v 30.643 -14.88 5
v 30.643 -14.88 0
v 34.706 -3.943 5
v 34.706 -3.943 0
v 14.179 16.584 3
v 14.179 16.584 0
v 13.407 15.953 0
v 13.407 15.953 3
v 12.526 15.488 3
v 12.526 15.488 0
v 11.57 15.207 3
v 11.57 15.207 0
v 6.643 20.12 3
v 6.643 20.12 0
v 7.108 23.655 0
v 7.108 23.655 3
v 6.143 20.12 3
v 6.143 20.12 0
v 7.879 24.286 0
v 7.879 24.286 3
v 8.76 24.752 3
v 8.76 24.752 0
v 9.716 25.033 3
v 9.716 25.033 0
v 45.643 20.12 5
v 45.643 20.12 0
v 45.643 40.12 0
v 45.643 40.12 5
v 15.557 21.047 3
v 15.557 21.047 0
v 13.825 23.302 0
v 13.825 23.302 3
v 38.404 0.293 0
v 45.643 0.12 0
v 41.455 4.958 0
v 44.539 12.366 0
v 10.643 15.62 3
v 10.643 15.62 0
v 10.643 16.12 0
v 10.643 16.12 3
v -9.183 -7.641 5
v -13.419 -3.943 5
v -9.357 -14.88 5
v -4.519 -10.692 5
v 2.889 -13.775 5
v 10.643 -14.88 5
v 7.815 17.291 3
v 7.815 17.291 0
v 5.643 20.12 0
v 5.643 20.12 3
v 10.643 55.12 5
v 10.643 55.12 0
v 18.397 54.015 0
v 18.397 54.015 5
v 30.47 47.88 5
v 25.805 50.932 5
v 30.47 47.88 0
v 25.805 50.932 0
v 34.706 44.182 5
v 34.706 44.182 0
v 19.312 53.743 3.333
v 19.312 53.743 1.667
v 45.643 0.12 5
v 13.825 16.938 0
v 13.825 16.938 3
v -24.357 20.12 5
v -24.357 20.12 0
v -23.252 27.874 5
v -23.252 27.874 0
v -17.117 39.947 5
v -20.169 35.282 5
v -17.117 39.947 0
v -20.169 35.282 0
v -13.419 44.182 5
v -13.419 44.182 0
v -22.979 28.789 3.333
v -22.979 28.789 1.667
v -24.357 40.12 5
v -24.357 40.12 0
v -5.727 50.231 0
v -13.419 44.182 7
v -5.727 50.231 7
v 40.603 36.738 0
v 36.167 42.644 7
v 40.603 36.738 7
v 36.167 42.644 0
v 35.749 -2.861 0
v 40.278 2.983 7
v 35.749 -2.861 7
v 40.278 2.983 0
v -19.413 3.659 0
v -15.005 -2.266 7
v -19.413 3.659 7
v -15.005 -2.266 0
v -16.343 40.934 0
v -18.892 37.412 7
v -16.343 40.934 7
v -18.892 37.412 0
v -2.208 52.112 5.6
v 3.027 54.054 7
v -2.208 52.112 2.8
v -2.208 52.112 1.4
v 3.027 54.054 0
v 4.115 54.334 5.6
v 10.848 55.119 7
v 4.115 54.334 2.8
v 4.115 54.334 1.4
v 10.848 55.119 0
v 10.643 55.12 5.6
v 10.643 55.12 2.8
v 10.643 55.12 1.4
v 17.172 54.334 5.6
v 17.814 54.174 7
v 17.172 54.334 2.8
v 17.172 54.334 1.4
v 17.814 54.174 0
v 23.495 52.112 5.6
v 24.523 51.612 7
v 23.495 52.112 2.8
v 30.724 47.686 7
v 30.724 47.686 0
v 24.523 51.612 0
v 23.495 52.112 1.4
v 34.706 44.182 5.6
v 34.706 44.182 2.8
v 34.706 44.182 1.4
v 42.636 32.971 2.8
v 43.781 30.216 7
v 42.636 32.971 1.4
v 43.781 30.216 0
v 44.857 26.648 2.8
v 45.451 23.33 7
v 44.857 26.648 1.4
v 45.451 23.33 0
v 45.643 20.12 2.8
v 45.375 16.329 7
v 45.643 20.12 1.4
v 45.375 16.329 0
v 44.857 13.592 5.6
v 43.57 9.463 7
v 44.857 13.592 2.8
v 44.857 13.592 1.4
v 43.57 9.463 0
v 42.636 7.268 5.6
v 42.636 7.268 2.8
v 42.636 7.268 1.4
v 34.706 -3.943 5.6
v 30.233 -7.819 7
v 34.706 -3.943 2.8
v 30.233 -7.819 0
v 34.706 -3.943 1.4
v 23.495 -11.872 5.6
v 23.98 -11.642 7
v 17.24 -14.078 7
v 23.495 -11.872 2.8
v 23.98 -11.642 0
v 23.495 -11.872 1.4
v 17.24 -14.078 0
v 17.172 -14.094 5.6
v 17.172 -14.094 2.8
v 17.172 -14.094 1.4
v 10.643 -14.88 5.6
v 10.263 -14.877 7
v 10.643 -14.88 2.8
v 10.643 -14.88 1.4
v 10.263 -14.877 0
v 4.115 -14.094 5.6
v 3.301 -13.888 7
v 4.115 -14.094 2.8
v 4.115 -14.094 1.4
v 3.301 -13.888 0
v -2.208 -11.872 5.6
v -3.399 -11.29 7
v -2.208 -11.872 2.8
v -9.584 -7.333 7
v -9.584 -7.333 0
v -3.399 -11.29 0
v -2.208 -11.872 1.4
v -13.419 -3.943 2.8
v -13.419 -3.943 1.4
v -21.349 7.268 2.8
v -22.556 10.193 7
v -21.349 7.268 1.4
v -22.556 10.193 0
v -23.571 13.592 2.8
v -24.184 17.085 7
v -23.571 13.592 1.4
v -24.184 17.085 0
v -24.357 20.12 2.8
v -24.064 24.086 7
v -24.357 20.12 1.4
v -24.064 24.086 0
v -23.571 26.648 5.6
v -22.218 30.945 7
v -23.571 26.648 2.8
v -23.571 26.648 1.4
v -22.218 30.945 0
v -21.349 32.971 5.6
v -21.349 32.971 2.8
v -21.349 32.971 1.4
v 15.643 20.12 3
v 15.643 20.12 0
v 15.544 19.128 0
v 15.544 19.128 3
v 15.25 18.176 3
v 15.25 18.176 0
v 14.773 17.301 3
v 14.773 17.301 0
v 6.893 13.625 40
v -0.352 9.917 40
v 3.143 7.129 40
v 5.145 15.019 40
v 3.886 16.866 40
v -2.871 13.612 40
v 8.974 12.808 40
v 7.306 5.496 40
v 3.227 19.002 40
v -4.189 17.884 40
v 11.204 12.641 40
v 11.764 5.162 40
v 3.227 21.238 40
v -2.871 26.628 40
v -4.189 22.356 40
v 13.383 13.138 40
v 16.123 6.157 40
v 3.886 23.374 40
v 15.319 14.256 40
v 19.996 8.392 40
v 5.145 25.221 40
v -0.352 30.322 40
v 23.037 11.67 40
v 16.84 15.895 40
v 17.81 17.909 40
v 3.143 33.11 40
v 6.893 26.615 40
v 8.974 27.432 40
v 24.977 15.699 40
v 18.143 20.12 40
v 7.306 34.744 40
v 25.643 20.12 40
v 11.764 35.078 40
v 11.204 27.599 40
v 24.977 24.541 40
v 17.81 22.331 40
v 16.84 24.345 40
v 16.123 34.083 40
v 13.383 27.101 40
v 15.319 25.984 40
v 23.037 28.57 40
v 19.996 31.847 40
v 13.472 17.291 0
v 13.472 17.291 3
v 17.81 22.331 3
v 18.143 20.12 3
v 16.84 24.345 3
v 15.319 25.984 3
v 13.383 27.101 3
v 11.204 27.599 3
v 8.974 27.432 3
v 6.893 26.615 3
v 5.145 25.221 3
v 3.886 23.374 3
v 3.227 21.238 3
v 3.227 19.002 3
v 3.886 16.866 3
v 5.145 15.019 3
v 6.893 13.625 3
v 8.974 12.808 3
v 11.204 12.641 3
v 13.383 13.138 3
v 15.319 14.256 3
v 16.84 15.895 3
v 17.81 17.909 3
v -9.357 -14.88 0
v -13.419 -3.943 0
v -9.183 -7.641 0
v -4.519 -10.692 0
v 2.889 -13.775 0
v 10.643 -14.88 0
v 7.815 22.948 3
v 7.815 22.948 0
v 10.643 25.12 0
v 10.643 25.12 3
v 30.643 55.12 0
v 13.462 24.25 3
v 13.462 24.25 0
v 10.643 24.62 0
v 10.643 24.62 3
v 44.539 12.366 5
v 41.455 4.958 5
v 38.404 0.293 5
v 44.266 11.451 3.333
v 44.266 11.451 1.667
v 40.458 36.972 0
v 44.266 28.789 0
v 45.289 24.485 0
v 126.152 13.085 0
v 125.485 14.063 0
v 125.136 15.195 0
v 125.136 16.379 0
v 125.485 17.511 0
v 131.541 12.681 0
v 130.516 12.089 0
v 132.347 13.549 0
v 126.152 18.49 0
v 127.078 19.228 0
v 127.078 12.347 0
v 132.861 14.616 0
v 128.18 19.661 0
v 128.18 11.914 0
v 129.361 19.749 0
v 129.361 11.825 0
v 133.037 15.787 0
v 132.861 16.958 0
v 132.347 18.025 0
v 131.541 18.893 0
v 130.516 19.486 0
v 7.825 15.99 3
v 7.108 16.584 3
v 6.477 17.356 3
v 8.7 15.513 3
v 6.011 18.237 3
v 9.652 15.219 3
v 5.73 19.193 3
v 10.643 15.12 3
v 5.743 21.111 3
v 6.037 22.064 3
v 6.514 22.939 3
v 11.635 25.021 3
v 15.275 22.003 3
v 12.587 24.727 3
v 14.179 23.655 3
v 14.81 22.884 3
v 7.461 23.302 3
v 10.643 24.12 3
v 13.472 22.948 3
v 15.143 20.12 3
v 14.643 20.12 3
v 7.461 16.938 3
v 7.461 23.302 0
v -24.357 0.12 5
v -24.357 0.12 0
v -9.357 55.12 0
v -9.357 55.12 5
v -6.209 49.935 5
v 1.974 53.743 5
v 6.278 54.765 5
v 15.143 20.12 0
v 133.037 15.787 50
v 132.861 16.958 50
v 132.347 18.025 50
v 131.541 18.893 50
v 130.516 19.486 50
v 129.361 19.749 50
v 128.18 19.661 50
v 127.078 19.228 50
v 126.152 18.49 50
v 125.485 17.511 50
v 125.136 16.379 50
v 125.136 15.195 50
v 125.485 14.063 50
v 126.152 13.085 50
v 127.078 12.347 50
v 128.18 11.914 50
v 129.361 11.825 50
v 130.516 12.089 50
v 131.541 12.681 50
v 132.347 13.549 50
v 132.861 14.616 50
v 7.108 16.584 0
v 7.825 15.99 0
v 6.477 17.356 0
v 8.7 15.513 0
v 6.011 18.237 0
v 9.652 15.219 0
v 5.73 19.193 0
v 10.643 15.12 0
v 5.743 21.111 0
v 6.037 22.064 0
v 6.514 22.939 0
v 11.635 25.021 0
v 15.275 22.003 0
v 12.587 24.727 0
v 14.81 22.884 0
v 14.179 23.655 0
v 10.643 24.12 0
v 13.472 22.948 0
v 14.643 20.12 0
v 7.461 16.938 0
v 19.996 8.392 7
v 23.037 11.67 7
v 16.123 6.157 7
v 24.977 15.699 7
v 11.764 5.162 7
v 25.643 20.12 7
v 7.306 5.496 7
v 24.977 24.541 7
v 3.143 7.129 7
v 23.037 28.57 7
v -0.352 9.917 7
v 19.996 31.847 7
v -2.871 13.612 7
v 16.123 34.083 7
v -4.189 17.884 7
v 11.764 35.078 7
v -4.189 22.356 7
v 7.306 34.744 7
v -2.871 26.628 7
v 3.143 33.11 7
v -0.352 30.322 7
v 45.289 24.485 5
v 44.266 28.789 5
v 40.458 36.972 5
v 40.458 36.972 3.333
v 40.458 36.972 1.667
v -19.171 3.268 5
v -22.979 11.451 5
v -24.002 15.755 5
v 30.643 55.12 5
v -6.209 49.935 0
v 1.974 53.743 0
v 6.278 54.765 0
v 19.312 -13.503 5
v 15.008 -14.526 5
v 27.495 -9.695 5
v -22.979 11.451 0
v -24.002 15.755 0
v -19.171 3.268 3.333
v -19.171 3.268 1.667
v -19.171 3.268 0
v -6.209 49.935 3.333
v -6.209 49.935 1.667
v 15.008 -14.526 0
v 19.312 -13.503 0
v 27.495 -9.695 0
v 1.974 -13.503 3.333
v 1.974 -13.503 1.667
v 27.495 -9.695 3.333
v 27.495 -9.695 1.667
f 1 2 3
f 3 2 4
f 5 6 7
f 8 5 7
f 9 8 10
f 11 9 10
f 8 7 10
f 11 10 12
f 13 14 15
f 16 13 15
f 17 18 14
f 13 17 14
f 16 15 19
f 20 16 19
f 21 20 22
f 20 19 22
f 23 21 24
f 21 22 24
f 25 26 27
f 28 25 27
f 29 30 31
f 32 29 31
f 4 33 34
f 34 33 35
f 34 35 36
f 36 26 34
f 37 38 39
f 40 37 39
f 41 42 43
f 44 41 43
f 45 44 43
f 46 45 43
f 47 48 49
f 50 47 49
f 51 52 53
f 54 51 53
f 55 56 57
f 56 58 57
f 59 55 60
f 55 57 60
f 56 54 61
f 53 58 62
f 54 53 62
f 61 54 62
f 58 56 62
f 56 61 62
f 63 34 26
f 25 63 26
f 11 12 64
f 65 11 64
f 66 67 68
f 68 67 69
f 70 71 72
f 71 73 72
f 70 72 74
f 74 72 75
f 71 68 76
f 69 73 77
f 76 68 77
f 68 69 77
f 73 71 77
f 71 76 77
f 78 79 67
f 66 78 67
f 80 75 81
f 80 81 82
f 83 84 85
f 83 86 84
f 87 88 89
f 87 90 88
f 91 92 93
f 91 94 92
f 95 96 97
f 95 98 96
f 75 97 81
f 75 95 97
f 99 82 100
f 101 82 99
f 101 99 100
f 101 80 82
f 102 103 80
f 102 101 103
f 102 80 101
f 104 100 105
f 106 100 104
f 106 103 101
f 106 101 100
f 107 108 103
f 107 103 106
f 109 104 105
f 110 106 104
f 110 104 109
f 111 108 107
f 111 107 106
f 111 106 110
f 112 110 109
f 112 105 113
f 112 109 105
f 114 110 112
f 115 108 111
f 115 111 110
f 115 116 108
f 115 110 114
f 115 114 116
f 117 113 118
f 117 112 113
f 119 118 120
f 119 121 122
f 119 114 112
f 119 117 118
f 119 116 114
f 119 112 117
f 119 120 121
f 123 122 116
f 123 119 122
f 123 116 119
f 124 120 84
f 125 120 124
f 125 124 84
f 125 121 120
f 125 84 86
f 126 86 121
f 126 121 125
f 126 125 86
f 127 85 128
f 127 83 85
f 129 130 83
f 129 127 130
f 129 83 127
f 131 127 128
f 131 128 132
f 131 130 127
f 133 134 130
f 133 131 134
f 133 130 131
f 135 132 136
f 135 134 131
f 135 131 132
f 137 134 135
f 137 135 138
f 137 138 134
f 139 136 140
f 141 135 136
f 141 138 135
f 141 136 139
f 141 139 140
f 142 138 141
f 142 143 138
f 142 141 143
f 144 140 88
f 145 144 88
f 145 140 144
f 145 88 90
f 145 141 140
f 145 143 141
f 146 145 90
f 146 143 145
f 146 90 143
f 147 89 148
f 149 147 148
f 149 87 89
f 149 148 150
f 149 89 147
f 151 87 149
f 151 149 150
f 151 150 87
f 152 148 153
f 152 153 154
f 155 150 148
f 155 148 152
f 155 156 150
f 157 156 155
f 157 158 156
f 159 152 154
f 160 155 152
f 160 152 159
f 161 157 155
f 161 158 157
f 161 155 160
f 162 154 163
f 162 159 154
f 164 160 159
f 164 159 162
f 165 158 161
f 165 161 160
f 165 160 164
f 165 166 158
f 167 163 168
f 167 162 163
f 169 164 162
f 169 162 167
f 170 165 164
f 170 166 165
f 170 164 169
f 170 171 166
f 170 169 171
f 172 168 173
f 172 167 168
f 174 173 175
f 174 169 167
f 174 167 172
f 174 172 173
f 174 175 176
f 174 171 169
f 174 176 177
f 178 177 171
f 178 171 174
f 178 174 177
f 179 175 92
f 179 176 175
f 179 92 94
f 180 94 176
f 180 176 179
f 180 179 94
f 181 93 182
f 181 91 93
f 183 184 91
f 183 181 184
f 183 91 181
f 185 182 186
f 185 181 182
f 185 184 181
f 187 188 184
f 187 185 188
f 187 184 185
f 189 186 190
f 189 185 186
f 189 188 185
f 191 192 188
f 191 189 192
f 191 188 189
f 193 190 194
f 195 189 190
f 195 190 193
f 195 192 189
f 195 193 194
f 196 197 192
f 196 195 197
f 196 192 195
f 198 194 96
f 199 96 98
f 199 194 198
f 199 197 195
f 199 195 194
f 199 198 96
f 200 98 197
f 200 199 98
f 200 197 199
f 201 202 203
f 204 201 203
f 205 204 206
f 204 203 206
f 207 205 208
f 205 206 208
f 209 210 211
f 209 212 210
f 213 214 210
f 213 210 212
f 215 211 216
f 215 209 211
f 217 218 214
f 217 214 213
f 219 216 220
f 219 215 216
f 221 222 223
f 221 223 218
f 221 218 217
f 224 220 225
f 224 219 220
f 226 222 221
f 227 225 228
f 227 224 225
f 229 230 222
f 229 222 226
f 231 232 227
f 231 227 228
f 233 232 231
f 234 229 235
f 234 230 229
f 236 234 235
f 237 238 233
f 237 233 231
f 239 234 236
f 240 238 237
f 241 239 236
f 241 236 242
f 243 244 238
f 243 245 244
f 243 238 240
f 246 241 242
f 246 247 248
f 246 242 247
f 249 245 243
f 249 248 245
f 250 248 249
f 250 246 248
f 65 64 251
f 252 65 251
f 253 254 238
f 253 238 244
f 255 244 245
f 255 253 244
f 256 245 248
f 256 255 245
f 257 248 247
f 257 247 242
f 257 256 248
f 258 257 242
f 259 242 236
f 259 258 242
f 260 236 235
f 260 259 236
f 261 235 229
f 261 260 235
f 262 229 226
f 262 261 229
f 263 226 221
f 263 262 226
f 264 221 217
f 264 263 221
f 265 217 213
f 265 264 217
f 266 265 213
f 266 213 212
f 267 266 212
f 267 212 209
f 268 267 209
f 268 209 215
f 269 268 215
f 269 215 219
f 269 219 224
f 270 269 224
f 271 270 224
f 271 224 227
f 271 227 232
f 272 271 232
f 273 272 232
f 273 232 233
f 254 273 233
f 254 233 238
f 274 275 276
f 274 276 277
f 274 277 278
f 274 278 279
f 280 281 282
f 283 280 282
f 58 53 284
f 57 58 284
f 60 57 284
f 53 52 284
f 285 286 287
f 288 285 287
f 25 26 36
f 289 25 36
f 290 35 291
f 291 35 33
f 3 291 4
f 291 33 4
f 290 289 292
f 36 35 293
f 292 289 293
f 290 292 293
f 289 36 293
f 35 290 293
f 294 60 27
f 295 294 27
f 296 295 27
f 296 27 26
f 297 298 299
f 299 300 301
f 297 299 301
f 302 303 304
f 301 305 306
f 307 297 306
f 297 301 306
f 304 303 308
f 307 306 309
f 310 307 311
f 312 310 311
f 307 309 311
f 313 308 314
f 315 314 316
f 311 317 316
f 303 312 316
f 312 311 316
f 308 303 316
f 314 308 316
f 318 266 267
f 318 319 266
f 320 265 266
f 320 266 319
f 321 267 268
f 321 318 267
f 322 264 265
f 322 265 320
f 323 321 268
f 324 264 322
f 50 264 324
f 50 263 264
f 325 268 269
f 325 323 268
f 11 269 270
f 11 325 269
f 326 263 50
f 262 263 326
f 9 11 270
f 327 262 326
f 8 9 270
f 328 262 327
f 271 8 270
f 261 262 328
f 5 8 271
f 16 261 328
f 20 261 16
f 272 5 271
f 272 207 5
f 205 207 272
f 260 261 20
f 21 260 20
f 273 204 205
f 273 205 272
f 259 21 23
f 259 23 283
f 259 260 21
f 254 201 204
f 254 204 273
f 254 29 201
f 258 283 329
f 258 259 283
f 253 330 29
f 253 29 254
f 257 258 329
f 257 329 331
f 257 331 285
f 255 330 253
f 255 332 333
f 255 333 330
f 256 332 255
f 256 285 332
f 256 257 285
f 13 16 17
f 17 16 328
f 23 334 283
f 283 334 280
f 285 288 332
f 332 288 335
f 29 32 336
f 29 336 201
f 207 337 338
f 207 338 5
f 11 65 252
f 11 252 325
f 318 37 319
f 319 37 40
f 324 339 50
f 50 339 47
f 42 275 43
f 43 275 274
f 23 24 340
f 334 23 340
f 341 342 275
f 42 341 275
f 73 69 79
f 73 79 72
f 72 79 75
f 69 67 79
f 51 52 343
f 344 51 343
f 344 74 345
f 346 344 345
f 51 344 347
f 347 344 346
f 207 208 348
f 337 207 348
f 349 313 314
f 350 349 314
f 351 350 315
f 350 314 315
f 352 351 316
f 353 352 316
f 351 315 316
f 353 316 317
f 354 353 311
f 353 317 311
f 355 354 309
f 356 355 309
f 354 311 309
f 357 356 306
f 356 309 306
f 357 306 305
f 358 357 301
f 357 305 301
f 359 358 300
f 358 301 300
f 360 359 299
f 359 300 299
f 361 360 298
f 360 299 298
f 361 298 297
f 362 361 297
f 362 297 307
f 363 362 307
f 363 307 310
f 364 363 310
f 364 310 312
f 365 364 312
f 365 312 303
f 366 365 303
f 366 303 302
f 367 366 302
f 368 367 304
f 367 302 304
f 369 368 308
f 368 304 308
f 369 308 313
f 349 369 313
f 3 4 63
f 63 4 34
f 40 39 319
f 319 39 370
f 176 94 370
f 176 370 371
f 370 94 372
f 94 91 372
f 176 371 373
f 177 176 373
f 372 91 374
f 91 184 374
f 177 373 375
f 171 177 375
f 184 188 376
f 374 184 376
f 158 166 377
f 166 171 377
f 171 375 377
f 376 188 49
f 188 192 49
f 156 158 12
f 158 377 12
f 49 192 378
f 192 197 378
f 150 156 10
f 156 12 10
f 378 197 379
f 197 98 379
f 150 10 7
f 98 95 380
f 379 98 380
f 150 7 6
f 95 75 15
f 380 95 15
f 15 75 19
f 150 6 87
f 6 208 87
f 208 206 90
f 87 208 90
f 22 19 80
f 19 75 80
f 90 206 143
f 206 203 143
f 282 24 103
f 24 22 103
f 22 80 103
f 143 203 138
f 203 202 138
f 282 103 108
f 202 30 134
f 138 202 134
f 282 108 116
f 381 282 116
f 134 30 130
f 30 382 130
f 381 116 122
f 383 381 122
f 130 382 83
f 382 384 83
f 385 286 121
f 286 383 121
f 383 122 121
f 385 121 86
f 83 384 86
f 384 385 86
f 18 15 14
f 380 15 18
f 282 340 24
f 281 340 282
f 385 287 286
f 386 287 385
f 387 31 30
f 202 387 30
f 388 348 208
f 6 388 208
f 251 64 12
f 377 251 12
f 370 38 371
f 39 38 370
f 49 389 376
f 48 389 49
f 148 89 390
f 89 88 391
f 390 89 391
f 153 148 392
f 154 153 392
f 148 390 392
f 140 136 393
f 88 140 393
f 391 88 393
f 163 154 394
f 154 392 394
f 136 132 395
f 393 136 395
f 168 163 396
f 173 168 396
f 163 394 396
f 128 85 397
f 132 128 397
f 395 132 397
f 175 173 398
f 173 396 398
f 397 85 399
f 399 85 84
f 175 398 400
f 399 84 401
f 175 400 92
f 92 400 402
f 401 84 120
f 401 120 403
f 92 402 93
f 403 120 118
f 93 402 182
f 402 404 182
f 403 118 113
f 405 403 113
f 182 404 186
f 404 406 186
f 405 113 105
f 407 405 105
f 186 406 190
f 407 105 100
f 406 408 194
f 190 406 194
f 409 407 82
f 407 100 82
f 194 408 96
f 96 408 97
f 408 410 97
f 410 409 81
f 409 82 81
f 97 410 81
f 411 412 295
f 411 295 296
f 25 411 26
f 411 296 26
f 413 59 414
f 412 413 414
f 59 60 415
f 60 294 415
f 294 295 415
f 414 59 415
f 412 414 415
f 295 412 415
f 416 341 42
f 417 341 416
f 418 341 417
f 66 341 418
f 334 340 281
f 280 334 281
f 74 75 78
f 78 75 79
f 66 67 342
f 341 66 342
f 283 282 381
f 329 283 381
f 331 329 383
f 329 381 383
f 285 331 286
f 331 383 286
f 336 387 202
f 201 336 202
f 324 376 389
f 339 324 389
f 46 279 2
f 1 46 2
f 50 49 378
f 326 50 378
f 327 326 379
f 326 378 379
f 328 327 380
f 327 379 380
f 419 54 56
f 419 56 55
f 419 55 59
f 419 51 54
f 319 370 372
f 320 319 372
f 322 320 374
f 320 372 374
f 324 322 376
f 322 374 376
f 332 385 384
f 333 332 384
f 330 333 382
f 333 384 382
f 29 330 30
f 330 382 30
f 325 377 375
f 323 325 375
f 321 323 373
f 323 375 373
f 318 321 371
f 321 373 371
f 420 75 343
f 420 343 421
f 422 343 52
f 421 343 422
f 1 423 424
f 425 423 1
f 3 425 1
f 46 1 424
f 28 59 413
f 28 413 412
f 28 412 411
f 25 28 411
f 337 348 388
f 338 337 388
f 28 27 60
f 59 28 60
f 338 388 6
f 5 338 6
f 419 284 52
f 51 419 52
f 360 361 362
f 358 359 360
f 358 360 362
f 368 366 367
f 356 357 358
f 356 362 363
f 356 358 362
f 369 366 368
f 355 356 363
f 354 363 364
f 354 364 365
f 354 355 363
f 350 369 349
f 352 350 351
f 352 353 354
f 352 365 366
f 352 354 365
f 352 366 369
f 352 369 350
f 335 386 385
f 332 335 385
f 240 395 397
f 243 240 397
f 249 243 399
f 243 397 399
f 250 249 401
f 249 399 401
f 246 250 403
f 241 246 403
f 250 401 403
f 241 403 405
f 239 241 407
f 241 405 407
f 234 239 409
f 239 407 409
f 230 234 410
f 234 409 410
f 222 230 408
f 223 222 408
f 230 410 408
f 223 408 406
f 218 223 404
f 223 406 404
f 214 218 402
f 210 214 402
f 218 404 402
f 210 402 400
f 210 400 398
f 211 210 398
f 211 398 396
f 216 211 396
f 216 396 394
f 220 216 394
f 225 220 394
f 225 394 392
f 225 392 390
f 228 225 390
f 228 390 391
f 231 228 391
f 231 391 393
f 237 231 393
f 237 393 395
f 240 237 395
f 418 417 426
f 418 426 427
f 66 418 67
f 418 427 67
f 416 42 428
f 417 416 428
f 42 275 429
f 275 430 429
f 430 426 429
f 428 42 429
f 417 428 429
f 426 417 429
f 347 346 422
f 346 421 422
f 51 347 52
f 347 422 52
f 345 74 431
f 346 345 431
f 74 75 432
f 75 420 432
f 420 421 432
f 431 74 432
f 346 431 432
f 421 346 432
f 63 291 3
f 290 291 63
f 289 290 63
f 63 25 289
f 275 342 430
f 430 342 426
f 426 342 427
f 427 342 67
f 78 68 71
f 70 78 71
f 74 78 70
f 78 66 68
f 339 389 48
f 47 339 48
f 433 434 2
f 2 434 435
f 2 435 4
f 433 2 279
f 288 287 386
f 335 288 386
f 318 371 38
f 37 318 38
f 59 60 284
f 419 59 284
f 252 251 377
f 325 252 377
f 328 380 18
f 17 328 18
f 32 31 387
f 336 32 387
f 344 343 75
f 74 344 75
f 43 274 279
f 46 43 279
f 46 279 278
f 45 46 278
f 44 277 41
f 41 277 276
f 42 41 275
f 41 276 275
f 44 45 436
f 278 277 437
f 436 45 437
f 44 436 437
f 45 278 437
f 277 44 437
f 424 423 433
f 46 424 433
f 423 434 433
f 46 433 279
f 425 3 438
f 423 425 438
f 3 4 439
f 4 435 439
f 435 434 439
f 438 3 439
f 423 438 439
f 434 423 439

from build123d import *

# Parameters (mm, degrees)
F1_DEPTH = 5
F0_R     = 15
F2_DEPTH = 7
F0_R_2   = 7.5
F3_DEPTH = 40
F4_DEPTH = 3
F0_R_3   = 3.973
F5_DEPTH = 50


with BuildPart() as f1:
    # F0 (on Top) → F1 (new body)
    with BuildSketch(Plane.XY):
        with BuildLine():
            Line((-24.3566787988, 40.11987683), (-24.3566787988, 20.11987683))
            add(Edge.make_bspline(
                [(-24.3566787988, 20.11987683), (-24.3566787988, 28.86987683), (-19.9816787988, 37.61987683), (-13.4191787988, 44.18237683)],
                knots=[0, 0, 0, 0, 0.125, 0.125, 0.125, 0.125], degree=3))
            Line((-13.4191787988, 44.18237683), (-24.3566787988, 40.11987683))
        make_face()
    extrude(amount=F1_DEPTH)


with BuildPart() as f1b:
    # F0 (on Top) → F1, piece 2 (new body)
    with BuildSketch(Plane.XY):
        with BuildLine():
            Line((-9.3566787988, 55.11987683), (-13.4191787988, 44.18237683))
            add(Edge.make_bspline(
                [(-13.4191787988, 44.18237683), (-6.8566787988, 50.74487683), (1.8933212012, 55.11987683), (10.6433212012, 55.11987683)],
                knots=[0.125, 0.125, 0.125, 0.125, 0.25, 0.25, 0.25, 0.25], degree=3))
            Line((10.6433212012, 55.11987683), (-9.3566787988, 55.11987683))
        make_face()
    extrude(amount=F1_DEPTH)


with BuildPart() as f1c:
    # F0 (on Top) → F1, piece 3 (new body)
    with BuildSketch(Plane.XY):
        with BuildLine():
            Line((30.6433212012, 55.11987683), (10.6433212012, 55.11987683))
            add(Edge.make_bspline(
                [(10.6433212012, 55.11987683), (19.3933212012, 55.11987683), (28.1433212012, 50.74487683), (34.7058212012, 44.18237683)],
                knots=[0.25, 0.25, 0.25, 0.25, 0.375, 0.375, 0.375, 0.375], degree=3))
            Line((34.7058212012, 44.18237683), (30.6433212012, 55.11987683))
        make_face()
    extrude(amount=F1_DEPTH)


with BuildPart() as f1d:
    # F0 (on Top) → F1, piece 4 (new body)
    with BuildSketch(Plane.XY):
        with BuildLine():
            Line((45.6433212012, 40.11987683), (34.7058212012, 44.18237683))
            add(Edge.make_bspline(
                [(34.7058212012, 44.18237683), (41.2683212012, 37.61987683), (45.6433212012, 28.86987683), (45.6433212012, 20.11987683)],
                knots=[0.375, 0.375, 0.375, 0.375, 0.5, 0.5, 0.5, 0.5], degree=3))
            Line((45.6433212012, 20.11987683), (45.6433212012, 40.11987683))
        make_face()
    extrude(amount=F1_DEPTH)


with BuildPart() as f1e:
    # F0 (on Top) → F1, piece 5 (new body)
    with BuildSketch(Plane.XY):
        with BuildLine():
            add(Edge.make_bspline(
                [(45.6433212012, 20.11987683), (45.6433212012, 11.36987683), (41.2683212012, 2.61987683), (34.7058212012, -3.94262317)],
                knots=[0.5, 0.5, 0.5, 0.5, 0.625, 0.625, 0.625, 0.625], degree=3))
            Line((34.7058212012, -3.94262317), (45.6433212012, 0.11987683))
            Line((45.6433212012, 0.11987683), (45.6433212012, 20.11987683))
        make_face()
    extrude(amount=F1_DEPTH)


with BuildPart() as f1f:
    # F0 (on Top) → F1, piece 6 (new body)
    with BuildSketch(Plane.XY):
        with BuildLine():
            add(Edge.make_bspline(
                [(34.7058212012, -3.94262317), (28.1433212012, -10.50512317), (19.3933212012, -14.88012317), (10.6433212012, -14.88012317)],
                knots=[0.625, 0.625, 0.625, 0.625, 0.75, 0.75, 0.75, 0.75], degree=3))
            Line((10.6433212012, -14.88012317), (30.6433212012, -14.88012317))
            Line((30.6433212012, -14.88012317), (34.7058212012, -3.94262317))
        make_face()
    extrude(amount=F1_DEPTH)


with BuildPart() as f1g:
    # F0 (on Top) → F1, piece 7 (new body)
    with BuildSketch(Plane.XY):
        with BuildLine():
            add(Edge.make_bspline(
                [(10.6433212012, -14.88012317), (1.8933212012, -14.88012317), (-6.8566787988, -10.50512317), (-13.4191787988, -3.94262317)],
                knots=[0.75, 0.75, 0.75, 0.75, 0.875, 0.875, 0.875, 0.875], degree=3))
            Line((-13.4191787988, -3.94262317), (-9.3566787988, -14.88012317))
            Line((-9.3566787988, -14.88012317), (10.6433212012, -14.88012317))
        make_face()
    extrude(amount=F1_DEPTH)


with BuildPart() as f1h:
    # F0 (on Top) → F1, piece 8 (new body)
    with BuildSketch(Plane.XY):
        with BuildLine():
            add(Edge.make_bspline(
                [(-13.4191787988, -3.94262317), (-19.9816787988, 2.61987683), (-24.3566787988, 11.36987683), (-24.3566787988, 20.11987683)],
                knots=[0.875, 0.875, 0.875, 0.875, 1, 1, 1, 1], degree=3))
            Line((-24.3566787988, 20.11987683), (-24.3566787988, 0.11987683))
            Line((-24.3566787988, 0.11987683), (-13.4191787988, -3.94262317))
        make_face()
    extrude(amount=F1_DEPTH)


with BuildPart() as f2:
    # F0 (on Top) → F2 (new body)
    with BuildSketch(Plane.XY):
        with BuildLine():
            add(Edge.make_bspline(
                [(-24.3566787988, 20.11987683), (-24.3566787988, 28.86987683), (-19.9816787988, 37.61987683), (-13.4191787988, 44.18237683)],
                knots=[0, 0, 0, 0, 0.125, 0.125, 0.125, 0.125], degree=3))
            add(Edge.make_bspline(
                [(-13.4191787988, -3.94262317), (-19.9816787988, 2.61987683), (-24.3566787988, 11.36987683), (-24.3566787988, 20.11987683)],
                knots=[0.875, 0.875, 0.875, 0.875, 1, 1, 1, 1], degree=3))
            add(Edge.make_bspline(
                [(10.6433212012, -14.88012317), (1.8933212012, -14.88012317), (-6.8566787988, -10.50512317), (-13.4191787988, -3.94262317)],
                knots=[0.75, 0.75, 0.75, 0.75, 0.875, 0.875, 0.875, 0.875], degree=3))
            add(Edge.make_bspline(
                [(34.7058212012, -3.94262317), (28.1433212012, -10.50512317), (19.3933212012, -14.88012317), (10.6433212012, -14.88012317)],
                knots=[0.625, 0.625, 0.625, 0.625, 0.75, 0.75, 0.75, 0.75], degree=3))
            add(Edge.make_bspline(
                [(45.6433212012, 20.11987683), (45.6433212012, 11.36987683), (41.2683212012, 2.61987683), (34.7058212012, -3.94262317)],
                knots=[0.5, 0.5, 0.5, 0.5, 0.625, 0.625, 0.625, 0.625], degree=3))
            add(Edge.make_bspline(
                [(34.7058212012, 44.18237683), (41.2683212012, 37.61987683), (45.6433212012, 28.86987683), (45.6433212012, 20.11987683)],
                knots=[0.375, 0.375, 0.375, 0.375, 0.5, 0.5, 0.5, 0.5], degree=3))
            add(Edge.make_bspline(
                [(10.6433212012, 55.11987683), (19.3933212012, 55.11987683), (28.1433212012, 50.74487683), (34.7058212012, 44.18237683)],
                knots=[0.25, 0.25, 0.25, 0.25, 0.375, 0.375, 0.375, 0.375], degree=3))
            add(Edge.make_bspline(
                [(-13.4191787988, 44.18237683), (-6.8566787988, 50.74487683), (1.8933212012, 55.11987683), (10.6433212012, 55.11987683)],
                knots=[0.125, 0.125, 0.125, 0.125, 0.25, 0.25, 0.25, 0.25], degree=3))
        make_face()
        with Locations((10.6433212012, 20.11987683)):
            Circle(F0_R, mode=Mode.SUBTRACT)
    extrude(amount=F2_DEPTH)

    # F0 (on Top) → F3 (join)
    with BuildSketch(Plane.XY):
        with Locations((10.6433212012, 20.11987683)):
            Circle(F0_R)
        with Locations((10.6433212012, 20.11987683)):
            Circle(F0_R_2, mode=Mode.SUBTRACT)
    extrude(amount=F3_DEPTH)

    # F0 (on Top) → F4 (join)
    with BuildSketch(Plane.XY):
        with Locations((10.6433212012, 20.11987683)):
            Circle(F0_R_2)
        with BuildLine():
            ThreePointArc((7.1077872953, 23.655410736), (8.3081566414, 24.5410764951), (9.7163827591, 25.0332041267))
            Line((9.7163827591, 25.0332041267), (7.4613406859, 23.3018573454))
            Line((7.4613406859, 23.3018573454), (7.8148940765, 22.9483039548))
            Line((7.8148940765, 22.9483039548), (10.6433212012, 25.11987683))
            ThreePointArc((10.6433212012, 25.11987683), (12.11837077, 24.8973477896), (13.4621237927, 24.2495683379))
            Line((13.4621237927, 24.2495683379), (10.6433212012, 24.61987683))
            Line((10.6433212012, 24.61987683), (10.6433212012, 24.11987683))
            Line((10.6433212012, 24.11987683), (14.1788551071, 23.655410736))
            ThreePointArc((14.1788551071, 23.655410736), (15.0645208663, 22.4550413898), (15.5566484979, 21.0468152722))
            Line((15.5566484979, 21.0468152722), (13.8253017165, 23.3018573454))
            Line((13.8253017165, 23.3018573454), (13.471748326, 22.9483039548))
            Line((13.471748326, 22.9483039548), (15.6433212012, 20.11987683))
            ThreePointArc((15.6433212012, 20.11987683), (15.4207921608, 18.6448272613), (14.7730127091, 17.3010742385))
            Line((14.7730127091, 17.3010742385), (15.1433212012, 20.11987683))
            Line((15.1433212012, 20.11987683), (14.6433212012, 20.11987683))
            Line((14.6433212012, 20.11987683), (14.1788551071, 16.5843429241))
            ThreePointArc((14.1788551071, 16.5843429241), (12.978485761, 15.6986771649), (11.5702596433, 15.2065495333))
            Line((11.5702596433, 15.2065495333), (13.8253017165, 16.9378963147))
            Line((13.8253017165, 16.9378963147), (13.471748326, 17.2914497053))
            Line((13.471748326, 17.2914497053), (10.6433212012, 15.11987683))
            ThreePointArc((10.6433212012, 15.11987683), (9.1682716324, 15.3424058705), (7.8245186097, 15.9901853222))
            Line((7.8245186097, 15.9901853222), (10.6433212012, 15.61987683))
            Line((10.6433212012, 15.61987683), (10.6433212012, 16.11987683))
            Line((10.6433212012, 16.11987683), (7.1077872953, 16.5843429241))
            ThreePointArc((7.1077872953, 16.5843429241), (6.2221215361, 17.7847122703), (5.7299939045, 19.1929383879))
            Line((5.7299939045, 19.1929383879), (7.4613406859, 16.9378963147))
            Line((7.4613406859, 16.9378963147), (7.6381173812, 17.11467301))
            Line((7.6381173812, 17.11467301), (7.8148940765, 17.2914497053))
            Line((7.8148940765, 17.2914497053), (5.6433212012, 20.11987683))
            ThreePointArc((5.6433212012, 20.11987683), (5.8658502416, 21.5949263988), (6.5136296933, 22.9386794215))
            Line((6.5136296933, 22.9386794215), (6.1433212012, 20.11987683))
            Line((6.1433212012, 20.11987683), (6.6433212012, 20.11987683))
            Line((6.6433212012, 20.11987683), (7.1077872953, 23.655410736))
        make_face(mode=Mode.SUBTRACT)
    extrude(amount=F4_DEPTH)


with BuildPart() as f5:
    # F0 (on Top) → F5 (new body)
    with BuildSketch(Plane.XY):
        with Locations((129.0643662214, 15.7872345299)):
            Circle(F0_R_3)
    extrude(amount=F5_DEPTH)


solid = Compound([f1.part, f1b.part, f1c.part, f1d.part, f1e.part, f1f.part, f1g.part, f1h.part, f2.part, f5.part])
